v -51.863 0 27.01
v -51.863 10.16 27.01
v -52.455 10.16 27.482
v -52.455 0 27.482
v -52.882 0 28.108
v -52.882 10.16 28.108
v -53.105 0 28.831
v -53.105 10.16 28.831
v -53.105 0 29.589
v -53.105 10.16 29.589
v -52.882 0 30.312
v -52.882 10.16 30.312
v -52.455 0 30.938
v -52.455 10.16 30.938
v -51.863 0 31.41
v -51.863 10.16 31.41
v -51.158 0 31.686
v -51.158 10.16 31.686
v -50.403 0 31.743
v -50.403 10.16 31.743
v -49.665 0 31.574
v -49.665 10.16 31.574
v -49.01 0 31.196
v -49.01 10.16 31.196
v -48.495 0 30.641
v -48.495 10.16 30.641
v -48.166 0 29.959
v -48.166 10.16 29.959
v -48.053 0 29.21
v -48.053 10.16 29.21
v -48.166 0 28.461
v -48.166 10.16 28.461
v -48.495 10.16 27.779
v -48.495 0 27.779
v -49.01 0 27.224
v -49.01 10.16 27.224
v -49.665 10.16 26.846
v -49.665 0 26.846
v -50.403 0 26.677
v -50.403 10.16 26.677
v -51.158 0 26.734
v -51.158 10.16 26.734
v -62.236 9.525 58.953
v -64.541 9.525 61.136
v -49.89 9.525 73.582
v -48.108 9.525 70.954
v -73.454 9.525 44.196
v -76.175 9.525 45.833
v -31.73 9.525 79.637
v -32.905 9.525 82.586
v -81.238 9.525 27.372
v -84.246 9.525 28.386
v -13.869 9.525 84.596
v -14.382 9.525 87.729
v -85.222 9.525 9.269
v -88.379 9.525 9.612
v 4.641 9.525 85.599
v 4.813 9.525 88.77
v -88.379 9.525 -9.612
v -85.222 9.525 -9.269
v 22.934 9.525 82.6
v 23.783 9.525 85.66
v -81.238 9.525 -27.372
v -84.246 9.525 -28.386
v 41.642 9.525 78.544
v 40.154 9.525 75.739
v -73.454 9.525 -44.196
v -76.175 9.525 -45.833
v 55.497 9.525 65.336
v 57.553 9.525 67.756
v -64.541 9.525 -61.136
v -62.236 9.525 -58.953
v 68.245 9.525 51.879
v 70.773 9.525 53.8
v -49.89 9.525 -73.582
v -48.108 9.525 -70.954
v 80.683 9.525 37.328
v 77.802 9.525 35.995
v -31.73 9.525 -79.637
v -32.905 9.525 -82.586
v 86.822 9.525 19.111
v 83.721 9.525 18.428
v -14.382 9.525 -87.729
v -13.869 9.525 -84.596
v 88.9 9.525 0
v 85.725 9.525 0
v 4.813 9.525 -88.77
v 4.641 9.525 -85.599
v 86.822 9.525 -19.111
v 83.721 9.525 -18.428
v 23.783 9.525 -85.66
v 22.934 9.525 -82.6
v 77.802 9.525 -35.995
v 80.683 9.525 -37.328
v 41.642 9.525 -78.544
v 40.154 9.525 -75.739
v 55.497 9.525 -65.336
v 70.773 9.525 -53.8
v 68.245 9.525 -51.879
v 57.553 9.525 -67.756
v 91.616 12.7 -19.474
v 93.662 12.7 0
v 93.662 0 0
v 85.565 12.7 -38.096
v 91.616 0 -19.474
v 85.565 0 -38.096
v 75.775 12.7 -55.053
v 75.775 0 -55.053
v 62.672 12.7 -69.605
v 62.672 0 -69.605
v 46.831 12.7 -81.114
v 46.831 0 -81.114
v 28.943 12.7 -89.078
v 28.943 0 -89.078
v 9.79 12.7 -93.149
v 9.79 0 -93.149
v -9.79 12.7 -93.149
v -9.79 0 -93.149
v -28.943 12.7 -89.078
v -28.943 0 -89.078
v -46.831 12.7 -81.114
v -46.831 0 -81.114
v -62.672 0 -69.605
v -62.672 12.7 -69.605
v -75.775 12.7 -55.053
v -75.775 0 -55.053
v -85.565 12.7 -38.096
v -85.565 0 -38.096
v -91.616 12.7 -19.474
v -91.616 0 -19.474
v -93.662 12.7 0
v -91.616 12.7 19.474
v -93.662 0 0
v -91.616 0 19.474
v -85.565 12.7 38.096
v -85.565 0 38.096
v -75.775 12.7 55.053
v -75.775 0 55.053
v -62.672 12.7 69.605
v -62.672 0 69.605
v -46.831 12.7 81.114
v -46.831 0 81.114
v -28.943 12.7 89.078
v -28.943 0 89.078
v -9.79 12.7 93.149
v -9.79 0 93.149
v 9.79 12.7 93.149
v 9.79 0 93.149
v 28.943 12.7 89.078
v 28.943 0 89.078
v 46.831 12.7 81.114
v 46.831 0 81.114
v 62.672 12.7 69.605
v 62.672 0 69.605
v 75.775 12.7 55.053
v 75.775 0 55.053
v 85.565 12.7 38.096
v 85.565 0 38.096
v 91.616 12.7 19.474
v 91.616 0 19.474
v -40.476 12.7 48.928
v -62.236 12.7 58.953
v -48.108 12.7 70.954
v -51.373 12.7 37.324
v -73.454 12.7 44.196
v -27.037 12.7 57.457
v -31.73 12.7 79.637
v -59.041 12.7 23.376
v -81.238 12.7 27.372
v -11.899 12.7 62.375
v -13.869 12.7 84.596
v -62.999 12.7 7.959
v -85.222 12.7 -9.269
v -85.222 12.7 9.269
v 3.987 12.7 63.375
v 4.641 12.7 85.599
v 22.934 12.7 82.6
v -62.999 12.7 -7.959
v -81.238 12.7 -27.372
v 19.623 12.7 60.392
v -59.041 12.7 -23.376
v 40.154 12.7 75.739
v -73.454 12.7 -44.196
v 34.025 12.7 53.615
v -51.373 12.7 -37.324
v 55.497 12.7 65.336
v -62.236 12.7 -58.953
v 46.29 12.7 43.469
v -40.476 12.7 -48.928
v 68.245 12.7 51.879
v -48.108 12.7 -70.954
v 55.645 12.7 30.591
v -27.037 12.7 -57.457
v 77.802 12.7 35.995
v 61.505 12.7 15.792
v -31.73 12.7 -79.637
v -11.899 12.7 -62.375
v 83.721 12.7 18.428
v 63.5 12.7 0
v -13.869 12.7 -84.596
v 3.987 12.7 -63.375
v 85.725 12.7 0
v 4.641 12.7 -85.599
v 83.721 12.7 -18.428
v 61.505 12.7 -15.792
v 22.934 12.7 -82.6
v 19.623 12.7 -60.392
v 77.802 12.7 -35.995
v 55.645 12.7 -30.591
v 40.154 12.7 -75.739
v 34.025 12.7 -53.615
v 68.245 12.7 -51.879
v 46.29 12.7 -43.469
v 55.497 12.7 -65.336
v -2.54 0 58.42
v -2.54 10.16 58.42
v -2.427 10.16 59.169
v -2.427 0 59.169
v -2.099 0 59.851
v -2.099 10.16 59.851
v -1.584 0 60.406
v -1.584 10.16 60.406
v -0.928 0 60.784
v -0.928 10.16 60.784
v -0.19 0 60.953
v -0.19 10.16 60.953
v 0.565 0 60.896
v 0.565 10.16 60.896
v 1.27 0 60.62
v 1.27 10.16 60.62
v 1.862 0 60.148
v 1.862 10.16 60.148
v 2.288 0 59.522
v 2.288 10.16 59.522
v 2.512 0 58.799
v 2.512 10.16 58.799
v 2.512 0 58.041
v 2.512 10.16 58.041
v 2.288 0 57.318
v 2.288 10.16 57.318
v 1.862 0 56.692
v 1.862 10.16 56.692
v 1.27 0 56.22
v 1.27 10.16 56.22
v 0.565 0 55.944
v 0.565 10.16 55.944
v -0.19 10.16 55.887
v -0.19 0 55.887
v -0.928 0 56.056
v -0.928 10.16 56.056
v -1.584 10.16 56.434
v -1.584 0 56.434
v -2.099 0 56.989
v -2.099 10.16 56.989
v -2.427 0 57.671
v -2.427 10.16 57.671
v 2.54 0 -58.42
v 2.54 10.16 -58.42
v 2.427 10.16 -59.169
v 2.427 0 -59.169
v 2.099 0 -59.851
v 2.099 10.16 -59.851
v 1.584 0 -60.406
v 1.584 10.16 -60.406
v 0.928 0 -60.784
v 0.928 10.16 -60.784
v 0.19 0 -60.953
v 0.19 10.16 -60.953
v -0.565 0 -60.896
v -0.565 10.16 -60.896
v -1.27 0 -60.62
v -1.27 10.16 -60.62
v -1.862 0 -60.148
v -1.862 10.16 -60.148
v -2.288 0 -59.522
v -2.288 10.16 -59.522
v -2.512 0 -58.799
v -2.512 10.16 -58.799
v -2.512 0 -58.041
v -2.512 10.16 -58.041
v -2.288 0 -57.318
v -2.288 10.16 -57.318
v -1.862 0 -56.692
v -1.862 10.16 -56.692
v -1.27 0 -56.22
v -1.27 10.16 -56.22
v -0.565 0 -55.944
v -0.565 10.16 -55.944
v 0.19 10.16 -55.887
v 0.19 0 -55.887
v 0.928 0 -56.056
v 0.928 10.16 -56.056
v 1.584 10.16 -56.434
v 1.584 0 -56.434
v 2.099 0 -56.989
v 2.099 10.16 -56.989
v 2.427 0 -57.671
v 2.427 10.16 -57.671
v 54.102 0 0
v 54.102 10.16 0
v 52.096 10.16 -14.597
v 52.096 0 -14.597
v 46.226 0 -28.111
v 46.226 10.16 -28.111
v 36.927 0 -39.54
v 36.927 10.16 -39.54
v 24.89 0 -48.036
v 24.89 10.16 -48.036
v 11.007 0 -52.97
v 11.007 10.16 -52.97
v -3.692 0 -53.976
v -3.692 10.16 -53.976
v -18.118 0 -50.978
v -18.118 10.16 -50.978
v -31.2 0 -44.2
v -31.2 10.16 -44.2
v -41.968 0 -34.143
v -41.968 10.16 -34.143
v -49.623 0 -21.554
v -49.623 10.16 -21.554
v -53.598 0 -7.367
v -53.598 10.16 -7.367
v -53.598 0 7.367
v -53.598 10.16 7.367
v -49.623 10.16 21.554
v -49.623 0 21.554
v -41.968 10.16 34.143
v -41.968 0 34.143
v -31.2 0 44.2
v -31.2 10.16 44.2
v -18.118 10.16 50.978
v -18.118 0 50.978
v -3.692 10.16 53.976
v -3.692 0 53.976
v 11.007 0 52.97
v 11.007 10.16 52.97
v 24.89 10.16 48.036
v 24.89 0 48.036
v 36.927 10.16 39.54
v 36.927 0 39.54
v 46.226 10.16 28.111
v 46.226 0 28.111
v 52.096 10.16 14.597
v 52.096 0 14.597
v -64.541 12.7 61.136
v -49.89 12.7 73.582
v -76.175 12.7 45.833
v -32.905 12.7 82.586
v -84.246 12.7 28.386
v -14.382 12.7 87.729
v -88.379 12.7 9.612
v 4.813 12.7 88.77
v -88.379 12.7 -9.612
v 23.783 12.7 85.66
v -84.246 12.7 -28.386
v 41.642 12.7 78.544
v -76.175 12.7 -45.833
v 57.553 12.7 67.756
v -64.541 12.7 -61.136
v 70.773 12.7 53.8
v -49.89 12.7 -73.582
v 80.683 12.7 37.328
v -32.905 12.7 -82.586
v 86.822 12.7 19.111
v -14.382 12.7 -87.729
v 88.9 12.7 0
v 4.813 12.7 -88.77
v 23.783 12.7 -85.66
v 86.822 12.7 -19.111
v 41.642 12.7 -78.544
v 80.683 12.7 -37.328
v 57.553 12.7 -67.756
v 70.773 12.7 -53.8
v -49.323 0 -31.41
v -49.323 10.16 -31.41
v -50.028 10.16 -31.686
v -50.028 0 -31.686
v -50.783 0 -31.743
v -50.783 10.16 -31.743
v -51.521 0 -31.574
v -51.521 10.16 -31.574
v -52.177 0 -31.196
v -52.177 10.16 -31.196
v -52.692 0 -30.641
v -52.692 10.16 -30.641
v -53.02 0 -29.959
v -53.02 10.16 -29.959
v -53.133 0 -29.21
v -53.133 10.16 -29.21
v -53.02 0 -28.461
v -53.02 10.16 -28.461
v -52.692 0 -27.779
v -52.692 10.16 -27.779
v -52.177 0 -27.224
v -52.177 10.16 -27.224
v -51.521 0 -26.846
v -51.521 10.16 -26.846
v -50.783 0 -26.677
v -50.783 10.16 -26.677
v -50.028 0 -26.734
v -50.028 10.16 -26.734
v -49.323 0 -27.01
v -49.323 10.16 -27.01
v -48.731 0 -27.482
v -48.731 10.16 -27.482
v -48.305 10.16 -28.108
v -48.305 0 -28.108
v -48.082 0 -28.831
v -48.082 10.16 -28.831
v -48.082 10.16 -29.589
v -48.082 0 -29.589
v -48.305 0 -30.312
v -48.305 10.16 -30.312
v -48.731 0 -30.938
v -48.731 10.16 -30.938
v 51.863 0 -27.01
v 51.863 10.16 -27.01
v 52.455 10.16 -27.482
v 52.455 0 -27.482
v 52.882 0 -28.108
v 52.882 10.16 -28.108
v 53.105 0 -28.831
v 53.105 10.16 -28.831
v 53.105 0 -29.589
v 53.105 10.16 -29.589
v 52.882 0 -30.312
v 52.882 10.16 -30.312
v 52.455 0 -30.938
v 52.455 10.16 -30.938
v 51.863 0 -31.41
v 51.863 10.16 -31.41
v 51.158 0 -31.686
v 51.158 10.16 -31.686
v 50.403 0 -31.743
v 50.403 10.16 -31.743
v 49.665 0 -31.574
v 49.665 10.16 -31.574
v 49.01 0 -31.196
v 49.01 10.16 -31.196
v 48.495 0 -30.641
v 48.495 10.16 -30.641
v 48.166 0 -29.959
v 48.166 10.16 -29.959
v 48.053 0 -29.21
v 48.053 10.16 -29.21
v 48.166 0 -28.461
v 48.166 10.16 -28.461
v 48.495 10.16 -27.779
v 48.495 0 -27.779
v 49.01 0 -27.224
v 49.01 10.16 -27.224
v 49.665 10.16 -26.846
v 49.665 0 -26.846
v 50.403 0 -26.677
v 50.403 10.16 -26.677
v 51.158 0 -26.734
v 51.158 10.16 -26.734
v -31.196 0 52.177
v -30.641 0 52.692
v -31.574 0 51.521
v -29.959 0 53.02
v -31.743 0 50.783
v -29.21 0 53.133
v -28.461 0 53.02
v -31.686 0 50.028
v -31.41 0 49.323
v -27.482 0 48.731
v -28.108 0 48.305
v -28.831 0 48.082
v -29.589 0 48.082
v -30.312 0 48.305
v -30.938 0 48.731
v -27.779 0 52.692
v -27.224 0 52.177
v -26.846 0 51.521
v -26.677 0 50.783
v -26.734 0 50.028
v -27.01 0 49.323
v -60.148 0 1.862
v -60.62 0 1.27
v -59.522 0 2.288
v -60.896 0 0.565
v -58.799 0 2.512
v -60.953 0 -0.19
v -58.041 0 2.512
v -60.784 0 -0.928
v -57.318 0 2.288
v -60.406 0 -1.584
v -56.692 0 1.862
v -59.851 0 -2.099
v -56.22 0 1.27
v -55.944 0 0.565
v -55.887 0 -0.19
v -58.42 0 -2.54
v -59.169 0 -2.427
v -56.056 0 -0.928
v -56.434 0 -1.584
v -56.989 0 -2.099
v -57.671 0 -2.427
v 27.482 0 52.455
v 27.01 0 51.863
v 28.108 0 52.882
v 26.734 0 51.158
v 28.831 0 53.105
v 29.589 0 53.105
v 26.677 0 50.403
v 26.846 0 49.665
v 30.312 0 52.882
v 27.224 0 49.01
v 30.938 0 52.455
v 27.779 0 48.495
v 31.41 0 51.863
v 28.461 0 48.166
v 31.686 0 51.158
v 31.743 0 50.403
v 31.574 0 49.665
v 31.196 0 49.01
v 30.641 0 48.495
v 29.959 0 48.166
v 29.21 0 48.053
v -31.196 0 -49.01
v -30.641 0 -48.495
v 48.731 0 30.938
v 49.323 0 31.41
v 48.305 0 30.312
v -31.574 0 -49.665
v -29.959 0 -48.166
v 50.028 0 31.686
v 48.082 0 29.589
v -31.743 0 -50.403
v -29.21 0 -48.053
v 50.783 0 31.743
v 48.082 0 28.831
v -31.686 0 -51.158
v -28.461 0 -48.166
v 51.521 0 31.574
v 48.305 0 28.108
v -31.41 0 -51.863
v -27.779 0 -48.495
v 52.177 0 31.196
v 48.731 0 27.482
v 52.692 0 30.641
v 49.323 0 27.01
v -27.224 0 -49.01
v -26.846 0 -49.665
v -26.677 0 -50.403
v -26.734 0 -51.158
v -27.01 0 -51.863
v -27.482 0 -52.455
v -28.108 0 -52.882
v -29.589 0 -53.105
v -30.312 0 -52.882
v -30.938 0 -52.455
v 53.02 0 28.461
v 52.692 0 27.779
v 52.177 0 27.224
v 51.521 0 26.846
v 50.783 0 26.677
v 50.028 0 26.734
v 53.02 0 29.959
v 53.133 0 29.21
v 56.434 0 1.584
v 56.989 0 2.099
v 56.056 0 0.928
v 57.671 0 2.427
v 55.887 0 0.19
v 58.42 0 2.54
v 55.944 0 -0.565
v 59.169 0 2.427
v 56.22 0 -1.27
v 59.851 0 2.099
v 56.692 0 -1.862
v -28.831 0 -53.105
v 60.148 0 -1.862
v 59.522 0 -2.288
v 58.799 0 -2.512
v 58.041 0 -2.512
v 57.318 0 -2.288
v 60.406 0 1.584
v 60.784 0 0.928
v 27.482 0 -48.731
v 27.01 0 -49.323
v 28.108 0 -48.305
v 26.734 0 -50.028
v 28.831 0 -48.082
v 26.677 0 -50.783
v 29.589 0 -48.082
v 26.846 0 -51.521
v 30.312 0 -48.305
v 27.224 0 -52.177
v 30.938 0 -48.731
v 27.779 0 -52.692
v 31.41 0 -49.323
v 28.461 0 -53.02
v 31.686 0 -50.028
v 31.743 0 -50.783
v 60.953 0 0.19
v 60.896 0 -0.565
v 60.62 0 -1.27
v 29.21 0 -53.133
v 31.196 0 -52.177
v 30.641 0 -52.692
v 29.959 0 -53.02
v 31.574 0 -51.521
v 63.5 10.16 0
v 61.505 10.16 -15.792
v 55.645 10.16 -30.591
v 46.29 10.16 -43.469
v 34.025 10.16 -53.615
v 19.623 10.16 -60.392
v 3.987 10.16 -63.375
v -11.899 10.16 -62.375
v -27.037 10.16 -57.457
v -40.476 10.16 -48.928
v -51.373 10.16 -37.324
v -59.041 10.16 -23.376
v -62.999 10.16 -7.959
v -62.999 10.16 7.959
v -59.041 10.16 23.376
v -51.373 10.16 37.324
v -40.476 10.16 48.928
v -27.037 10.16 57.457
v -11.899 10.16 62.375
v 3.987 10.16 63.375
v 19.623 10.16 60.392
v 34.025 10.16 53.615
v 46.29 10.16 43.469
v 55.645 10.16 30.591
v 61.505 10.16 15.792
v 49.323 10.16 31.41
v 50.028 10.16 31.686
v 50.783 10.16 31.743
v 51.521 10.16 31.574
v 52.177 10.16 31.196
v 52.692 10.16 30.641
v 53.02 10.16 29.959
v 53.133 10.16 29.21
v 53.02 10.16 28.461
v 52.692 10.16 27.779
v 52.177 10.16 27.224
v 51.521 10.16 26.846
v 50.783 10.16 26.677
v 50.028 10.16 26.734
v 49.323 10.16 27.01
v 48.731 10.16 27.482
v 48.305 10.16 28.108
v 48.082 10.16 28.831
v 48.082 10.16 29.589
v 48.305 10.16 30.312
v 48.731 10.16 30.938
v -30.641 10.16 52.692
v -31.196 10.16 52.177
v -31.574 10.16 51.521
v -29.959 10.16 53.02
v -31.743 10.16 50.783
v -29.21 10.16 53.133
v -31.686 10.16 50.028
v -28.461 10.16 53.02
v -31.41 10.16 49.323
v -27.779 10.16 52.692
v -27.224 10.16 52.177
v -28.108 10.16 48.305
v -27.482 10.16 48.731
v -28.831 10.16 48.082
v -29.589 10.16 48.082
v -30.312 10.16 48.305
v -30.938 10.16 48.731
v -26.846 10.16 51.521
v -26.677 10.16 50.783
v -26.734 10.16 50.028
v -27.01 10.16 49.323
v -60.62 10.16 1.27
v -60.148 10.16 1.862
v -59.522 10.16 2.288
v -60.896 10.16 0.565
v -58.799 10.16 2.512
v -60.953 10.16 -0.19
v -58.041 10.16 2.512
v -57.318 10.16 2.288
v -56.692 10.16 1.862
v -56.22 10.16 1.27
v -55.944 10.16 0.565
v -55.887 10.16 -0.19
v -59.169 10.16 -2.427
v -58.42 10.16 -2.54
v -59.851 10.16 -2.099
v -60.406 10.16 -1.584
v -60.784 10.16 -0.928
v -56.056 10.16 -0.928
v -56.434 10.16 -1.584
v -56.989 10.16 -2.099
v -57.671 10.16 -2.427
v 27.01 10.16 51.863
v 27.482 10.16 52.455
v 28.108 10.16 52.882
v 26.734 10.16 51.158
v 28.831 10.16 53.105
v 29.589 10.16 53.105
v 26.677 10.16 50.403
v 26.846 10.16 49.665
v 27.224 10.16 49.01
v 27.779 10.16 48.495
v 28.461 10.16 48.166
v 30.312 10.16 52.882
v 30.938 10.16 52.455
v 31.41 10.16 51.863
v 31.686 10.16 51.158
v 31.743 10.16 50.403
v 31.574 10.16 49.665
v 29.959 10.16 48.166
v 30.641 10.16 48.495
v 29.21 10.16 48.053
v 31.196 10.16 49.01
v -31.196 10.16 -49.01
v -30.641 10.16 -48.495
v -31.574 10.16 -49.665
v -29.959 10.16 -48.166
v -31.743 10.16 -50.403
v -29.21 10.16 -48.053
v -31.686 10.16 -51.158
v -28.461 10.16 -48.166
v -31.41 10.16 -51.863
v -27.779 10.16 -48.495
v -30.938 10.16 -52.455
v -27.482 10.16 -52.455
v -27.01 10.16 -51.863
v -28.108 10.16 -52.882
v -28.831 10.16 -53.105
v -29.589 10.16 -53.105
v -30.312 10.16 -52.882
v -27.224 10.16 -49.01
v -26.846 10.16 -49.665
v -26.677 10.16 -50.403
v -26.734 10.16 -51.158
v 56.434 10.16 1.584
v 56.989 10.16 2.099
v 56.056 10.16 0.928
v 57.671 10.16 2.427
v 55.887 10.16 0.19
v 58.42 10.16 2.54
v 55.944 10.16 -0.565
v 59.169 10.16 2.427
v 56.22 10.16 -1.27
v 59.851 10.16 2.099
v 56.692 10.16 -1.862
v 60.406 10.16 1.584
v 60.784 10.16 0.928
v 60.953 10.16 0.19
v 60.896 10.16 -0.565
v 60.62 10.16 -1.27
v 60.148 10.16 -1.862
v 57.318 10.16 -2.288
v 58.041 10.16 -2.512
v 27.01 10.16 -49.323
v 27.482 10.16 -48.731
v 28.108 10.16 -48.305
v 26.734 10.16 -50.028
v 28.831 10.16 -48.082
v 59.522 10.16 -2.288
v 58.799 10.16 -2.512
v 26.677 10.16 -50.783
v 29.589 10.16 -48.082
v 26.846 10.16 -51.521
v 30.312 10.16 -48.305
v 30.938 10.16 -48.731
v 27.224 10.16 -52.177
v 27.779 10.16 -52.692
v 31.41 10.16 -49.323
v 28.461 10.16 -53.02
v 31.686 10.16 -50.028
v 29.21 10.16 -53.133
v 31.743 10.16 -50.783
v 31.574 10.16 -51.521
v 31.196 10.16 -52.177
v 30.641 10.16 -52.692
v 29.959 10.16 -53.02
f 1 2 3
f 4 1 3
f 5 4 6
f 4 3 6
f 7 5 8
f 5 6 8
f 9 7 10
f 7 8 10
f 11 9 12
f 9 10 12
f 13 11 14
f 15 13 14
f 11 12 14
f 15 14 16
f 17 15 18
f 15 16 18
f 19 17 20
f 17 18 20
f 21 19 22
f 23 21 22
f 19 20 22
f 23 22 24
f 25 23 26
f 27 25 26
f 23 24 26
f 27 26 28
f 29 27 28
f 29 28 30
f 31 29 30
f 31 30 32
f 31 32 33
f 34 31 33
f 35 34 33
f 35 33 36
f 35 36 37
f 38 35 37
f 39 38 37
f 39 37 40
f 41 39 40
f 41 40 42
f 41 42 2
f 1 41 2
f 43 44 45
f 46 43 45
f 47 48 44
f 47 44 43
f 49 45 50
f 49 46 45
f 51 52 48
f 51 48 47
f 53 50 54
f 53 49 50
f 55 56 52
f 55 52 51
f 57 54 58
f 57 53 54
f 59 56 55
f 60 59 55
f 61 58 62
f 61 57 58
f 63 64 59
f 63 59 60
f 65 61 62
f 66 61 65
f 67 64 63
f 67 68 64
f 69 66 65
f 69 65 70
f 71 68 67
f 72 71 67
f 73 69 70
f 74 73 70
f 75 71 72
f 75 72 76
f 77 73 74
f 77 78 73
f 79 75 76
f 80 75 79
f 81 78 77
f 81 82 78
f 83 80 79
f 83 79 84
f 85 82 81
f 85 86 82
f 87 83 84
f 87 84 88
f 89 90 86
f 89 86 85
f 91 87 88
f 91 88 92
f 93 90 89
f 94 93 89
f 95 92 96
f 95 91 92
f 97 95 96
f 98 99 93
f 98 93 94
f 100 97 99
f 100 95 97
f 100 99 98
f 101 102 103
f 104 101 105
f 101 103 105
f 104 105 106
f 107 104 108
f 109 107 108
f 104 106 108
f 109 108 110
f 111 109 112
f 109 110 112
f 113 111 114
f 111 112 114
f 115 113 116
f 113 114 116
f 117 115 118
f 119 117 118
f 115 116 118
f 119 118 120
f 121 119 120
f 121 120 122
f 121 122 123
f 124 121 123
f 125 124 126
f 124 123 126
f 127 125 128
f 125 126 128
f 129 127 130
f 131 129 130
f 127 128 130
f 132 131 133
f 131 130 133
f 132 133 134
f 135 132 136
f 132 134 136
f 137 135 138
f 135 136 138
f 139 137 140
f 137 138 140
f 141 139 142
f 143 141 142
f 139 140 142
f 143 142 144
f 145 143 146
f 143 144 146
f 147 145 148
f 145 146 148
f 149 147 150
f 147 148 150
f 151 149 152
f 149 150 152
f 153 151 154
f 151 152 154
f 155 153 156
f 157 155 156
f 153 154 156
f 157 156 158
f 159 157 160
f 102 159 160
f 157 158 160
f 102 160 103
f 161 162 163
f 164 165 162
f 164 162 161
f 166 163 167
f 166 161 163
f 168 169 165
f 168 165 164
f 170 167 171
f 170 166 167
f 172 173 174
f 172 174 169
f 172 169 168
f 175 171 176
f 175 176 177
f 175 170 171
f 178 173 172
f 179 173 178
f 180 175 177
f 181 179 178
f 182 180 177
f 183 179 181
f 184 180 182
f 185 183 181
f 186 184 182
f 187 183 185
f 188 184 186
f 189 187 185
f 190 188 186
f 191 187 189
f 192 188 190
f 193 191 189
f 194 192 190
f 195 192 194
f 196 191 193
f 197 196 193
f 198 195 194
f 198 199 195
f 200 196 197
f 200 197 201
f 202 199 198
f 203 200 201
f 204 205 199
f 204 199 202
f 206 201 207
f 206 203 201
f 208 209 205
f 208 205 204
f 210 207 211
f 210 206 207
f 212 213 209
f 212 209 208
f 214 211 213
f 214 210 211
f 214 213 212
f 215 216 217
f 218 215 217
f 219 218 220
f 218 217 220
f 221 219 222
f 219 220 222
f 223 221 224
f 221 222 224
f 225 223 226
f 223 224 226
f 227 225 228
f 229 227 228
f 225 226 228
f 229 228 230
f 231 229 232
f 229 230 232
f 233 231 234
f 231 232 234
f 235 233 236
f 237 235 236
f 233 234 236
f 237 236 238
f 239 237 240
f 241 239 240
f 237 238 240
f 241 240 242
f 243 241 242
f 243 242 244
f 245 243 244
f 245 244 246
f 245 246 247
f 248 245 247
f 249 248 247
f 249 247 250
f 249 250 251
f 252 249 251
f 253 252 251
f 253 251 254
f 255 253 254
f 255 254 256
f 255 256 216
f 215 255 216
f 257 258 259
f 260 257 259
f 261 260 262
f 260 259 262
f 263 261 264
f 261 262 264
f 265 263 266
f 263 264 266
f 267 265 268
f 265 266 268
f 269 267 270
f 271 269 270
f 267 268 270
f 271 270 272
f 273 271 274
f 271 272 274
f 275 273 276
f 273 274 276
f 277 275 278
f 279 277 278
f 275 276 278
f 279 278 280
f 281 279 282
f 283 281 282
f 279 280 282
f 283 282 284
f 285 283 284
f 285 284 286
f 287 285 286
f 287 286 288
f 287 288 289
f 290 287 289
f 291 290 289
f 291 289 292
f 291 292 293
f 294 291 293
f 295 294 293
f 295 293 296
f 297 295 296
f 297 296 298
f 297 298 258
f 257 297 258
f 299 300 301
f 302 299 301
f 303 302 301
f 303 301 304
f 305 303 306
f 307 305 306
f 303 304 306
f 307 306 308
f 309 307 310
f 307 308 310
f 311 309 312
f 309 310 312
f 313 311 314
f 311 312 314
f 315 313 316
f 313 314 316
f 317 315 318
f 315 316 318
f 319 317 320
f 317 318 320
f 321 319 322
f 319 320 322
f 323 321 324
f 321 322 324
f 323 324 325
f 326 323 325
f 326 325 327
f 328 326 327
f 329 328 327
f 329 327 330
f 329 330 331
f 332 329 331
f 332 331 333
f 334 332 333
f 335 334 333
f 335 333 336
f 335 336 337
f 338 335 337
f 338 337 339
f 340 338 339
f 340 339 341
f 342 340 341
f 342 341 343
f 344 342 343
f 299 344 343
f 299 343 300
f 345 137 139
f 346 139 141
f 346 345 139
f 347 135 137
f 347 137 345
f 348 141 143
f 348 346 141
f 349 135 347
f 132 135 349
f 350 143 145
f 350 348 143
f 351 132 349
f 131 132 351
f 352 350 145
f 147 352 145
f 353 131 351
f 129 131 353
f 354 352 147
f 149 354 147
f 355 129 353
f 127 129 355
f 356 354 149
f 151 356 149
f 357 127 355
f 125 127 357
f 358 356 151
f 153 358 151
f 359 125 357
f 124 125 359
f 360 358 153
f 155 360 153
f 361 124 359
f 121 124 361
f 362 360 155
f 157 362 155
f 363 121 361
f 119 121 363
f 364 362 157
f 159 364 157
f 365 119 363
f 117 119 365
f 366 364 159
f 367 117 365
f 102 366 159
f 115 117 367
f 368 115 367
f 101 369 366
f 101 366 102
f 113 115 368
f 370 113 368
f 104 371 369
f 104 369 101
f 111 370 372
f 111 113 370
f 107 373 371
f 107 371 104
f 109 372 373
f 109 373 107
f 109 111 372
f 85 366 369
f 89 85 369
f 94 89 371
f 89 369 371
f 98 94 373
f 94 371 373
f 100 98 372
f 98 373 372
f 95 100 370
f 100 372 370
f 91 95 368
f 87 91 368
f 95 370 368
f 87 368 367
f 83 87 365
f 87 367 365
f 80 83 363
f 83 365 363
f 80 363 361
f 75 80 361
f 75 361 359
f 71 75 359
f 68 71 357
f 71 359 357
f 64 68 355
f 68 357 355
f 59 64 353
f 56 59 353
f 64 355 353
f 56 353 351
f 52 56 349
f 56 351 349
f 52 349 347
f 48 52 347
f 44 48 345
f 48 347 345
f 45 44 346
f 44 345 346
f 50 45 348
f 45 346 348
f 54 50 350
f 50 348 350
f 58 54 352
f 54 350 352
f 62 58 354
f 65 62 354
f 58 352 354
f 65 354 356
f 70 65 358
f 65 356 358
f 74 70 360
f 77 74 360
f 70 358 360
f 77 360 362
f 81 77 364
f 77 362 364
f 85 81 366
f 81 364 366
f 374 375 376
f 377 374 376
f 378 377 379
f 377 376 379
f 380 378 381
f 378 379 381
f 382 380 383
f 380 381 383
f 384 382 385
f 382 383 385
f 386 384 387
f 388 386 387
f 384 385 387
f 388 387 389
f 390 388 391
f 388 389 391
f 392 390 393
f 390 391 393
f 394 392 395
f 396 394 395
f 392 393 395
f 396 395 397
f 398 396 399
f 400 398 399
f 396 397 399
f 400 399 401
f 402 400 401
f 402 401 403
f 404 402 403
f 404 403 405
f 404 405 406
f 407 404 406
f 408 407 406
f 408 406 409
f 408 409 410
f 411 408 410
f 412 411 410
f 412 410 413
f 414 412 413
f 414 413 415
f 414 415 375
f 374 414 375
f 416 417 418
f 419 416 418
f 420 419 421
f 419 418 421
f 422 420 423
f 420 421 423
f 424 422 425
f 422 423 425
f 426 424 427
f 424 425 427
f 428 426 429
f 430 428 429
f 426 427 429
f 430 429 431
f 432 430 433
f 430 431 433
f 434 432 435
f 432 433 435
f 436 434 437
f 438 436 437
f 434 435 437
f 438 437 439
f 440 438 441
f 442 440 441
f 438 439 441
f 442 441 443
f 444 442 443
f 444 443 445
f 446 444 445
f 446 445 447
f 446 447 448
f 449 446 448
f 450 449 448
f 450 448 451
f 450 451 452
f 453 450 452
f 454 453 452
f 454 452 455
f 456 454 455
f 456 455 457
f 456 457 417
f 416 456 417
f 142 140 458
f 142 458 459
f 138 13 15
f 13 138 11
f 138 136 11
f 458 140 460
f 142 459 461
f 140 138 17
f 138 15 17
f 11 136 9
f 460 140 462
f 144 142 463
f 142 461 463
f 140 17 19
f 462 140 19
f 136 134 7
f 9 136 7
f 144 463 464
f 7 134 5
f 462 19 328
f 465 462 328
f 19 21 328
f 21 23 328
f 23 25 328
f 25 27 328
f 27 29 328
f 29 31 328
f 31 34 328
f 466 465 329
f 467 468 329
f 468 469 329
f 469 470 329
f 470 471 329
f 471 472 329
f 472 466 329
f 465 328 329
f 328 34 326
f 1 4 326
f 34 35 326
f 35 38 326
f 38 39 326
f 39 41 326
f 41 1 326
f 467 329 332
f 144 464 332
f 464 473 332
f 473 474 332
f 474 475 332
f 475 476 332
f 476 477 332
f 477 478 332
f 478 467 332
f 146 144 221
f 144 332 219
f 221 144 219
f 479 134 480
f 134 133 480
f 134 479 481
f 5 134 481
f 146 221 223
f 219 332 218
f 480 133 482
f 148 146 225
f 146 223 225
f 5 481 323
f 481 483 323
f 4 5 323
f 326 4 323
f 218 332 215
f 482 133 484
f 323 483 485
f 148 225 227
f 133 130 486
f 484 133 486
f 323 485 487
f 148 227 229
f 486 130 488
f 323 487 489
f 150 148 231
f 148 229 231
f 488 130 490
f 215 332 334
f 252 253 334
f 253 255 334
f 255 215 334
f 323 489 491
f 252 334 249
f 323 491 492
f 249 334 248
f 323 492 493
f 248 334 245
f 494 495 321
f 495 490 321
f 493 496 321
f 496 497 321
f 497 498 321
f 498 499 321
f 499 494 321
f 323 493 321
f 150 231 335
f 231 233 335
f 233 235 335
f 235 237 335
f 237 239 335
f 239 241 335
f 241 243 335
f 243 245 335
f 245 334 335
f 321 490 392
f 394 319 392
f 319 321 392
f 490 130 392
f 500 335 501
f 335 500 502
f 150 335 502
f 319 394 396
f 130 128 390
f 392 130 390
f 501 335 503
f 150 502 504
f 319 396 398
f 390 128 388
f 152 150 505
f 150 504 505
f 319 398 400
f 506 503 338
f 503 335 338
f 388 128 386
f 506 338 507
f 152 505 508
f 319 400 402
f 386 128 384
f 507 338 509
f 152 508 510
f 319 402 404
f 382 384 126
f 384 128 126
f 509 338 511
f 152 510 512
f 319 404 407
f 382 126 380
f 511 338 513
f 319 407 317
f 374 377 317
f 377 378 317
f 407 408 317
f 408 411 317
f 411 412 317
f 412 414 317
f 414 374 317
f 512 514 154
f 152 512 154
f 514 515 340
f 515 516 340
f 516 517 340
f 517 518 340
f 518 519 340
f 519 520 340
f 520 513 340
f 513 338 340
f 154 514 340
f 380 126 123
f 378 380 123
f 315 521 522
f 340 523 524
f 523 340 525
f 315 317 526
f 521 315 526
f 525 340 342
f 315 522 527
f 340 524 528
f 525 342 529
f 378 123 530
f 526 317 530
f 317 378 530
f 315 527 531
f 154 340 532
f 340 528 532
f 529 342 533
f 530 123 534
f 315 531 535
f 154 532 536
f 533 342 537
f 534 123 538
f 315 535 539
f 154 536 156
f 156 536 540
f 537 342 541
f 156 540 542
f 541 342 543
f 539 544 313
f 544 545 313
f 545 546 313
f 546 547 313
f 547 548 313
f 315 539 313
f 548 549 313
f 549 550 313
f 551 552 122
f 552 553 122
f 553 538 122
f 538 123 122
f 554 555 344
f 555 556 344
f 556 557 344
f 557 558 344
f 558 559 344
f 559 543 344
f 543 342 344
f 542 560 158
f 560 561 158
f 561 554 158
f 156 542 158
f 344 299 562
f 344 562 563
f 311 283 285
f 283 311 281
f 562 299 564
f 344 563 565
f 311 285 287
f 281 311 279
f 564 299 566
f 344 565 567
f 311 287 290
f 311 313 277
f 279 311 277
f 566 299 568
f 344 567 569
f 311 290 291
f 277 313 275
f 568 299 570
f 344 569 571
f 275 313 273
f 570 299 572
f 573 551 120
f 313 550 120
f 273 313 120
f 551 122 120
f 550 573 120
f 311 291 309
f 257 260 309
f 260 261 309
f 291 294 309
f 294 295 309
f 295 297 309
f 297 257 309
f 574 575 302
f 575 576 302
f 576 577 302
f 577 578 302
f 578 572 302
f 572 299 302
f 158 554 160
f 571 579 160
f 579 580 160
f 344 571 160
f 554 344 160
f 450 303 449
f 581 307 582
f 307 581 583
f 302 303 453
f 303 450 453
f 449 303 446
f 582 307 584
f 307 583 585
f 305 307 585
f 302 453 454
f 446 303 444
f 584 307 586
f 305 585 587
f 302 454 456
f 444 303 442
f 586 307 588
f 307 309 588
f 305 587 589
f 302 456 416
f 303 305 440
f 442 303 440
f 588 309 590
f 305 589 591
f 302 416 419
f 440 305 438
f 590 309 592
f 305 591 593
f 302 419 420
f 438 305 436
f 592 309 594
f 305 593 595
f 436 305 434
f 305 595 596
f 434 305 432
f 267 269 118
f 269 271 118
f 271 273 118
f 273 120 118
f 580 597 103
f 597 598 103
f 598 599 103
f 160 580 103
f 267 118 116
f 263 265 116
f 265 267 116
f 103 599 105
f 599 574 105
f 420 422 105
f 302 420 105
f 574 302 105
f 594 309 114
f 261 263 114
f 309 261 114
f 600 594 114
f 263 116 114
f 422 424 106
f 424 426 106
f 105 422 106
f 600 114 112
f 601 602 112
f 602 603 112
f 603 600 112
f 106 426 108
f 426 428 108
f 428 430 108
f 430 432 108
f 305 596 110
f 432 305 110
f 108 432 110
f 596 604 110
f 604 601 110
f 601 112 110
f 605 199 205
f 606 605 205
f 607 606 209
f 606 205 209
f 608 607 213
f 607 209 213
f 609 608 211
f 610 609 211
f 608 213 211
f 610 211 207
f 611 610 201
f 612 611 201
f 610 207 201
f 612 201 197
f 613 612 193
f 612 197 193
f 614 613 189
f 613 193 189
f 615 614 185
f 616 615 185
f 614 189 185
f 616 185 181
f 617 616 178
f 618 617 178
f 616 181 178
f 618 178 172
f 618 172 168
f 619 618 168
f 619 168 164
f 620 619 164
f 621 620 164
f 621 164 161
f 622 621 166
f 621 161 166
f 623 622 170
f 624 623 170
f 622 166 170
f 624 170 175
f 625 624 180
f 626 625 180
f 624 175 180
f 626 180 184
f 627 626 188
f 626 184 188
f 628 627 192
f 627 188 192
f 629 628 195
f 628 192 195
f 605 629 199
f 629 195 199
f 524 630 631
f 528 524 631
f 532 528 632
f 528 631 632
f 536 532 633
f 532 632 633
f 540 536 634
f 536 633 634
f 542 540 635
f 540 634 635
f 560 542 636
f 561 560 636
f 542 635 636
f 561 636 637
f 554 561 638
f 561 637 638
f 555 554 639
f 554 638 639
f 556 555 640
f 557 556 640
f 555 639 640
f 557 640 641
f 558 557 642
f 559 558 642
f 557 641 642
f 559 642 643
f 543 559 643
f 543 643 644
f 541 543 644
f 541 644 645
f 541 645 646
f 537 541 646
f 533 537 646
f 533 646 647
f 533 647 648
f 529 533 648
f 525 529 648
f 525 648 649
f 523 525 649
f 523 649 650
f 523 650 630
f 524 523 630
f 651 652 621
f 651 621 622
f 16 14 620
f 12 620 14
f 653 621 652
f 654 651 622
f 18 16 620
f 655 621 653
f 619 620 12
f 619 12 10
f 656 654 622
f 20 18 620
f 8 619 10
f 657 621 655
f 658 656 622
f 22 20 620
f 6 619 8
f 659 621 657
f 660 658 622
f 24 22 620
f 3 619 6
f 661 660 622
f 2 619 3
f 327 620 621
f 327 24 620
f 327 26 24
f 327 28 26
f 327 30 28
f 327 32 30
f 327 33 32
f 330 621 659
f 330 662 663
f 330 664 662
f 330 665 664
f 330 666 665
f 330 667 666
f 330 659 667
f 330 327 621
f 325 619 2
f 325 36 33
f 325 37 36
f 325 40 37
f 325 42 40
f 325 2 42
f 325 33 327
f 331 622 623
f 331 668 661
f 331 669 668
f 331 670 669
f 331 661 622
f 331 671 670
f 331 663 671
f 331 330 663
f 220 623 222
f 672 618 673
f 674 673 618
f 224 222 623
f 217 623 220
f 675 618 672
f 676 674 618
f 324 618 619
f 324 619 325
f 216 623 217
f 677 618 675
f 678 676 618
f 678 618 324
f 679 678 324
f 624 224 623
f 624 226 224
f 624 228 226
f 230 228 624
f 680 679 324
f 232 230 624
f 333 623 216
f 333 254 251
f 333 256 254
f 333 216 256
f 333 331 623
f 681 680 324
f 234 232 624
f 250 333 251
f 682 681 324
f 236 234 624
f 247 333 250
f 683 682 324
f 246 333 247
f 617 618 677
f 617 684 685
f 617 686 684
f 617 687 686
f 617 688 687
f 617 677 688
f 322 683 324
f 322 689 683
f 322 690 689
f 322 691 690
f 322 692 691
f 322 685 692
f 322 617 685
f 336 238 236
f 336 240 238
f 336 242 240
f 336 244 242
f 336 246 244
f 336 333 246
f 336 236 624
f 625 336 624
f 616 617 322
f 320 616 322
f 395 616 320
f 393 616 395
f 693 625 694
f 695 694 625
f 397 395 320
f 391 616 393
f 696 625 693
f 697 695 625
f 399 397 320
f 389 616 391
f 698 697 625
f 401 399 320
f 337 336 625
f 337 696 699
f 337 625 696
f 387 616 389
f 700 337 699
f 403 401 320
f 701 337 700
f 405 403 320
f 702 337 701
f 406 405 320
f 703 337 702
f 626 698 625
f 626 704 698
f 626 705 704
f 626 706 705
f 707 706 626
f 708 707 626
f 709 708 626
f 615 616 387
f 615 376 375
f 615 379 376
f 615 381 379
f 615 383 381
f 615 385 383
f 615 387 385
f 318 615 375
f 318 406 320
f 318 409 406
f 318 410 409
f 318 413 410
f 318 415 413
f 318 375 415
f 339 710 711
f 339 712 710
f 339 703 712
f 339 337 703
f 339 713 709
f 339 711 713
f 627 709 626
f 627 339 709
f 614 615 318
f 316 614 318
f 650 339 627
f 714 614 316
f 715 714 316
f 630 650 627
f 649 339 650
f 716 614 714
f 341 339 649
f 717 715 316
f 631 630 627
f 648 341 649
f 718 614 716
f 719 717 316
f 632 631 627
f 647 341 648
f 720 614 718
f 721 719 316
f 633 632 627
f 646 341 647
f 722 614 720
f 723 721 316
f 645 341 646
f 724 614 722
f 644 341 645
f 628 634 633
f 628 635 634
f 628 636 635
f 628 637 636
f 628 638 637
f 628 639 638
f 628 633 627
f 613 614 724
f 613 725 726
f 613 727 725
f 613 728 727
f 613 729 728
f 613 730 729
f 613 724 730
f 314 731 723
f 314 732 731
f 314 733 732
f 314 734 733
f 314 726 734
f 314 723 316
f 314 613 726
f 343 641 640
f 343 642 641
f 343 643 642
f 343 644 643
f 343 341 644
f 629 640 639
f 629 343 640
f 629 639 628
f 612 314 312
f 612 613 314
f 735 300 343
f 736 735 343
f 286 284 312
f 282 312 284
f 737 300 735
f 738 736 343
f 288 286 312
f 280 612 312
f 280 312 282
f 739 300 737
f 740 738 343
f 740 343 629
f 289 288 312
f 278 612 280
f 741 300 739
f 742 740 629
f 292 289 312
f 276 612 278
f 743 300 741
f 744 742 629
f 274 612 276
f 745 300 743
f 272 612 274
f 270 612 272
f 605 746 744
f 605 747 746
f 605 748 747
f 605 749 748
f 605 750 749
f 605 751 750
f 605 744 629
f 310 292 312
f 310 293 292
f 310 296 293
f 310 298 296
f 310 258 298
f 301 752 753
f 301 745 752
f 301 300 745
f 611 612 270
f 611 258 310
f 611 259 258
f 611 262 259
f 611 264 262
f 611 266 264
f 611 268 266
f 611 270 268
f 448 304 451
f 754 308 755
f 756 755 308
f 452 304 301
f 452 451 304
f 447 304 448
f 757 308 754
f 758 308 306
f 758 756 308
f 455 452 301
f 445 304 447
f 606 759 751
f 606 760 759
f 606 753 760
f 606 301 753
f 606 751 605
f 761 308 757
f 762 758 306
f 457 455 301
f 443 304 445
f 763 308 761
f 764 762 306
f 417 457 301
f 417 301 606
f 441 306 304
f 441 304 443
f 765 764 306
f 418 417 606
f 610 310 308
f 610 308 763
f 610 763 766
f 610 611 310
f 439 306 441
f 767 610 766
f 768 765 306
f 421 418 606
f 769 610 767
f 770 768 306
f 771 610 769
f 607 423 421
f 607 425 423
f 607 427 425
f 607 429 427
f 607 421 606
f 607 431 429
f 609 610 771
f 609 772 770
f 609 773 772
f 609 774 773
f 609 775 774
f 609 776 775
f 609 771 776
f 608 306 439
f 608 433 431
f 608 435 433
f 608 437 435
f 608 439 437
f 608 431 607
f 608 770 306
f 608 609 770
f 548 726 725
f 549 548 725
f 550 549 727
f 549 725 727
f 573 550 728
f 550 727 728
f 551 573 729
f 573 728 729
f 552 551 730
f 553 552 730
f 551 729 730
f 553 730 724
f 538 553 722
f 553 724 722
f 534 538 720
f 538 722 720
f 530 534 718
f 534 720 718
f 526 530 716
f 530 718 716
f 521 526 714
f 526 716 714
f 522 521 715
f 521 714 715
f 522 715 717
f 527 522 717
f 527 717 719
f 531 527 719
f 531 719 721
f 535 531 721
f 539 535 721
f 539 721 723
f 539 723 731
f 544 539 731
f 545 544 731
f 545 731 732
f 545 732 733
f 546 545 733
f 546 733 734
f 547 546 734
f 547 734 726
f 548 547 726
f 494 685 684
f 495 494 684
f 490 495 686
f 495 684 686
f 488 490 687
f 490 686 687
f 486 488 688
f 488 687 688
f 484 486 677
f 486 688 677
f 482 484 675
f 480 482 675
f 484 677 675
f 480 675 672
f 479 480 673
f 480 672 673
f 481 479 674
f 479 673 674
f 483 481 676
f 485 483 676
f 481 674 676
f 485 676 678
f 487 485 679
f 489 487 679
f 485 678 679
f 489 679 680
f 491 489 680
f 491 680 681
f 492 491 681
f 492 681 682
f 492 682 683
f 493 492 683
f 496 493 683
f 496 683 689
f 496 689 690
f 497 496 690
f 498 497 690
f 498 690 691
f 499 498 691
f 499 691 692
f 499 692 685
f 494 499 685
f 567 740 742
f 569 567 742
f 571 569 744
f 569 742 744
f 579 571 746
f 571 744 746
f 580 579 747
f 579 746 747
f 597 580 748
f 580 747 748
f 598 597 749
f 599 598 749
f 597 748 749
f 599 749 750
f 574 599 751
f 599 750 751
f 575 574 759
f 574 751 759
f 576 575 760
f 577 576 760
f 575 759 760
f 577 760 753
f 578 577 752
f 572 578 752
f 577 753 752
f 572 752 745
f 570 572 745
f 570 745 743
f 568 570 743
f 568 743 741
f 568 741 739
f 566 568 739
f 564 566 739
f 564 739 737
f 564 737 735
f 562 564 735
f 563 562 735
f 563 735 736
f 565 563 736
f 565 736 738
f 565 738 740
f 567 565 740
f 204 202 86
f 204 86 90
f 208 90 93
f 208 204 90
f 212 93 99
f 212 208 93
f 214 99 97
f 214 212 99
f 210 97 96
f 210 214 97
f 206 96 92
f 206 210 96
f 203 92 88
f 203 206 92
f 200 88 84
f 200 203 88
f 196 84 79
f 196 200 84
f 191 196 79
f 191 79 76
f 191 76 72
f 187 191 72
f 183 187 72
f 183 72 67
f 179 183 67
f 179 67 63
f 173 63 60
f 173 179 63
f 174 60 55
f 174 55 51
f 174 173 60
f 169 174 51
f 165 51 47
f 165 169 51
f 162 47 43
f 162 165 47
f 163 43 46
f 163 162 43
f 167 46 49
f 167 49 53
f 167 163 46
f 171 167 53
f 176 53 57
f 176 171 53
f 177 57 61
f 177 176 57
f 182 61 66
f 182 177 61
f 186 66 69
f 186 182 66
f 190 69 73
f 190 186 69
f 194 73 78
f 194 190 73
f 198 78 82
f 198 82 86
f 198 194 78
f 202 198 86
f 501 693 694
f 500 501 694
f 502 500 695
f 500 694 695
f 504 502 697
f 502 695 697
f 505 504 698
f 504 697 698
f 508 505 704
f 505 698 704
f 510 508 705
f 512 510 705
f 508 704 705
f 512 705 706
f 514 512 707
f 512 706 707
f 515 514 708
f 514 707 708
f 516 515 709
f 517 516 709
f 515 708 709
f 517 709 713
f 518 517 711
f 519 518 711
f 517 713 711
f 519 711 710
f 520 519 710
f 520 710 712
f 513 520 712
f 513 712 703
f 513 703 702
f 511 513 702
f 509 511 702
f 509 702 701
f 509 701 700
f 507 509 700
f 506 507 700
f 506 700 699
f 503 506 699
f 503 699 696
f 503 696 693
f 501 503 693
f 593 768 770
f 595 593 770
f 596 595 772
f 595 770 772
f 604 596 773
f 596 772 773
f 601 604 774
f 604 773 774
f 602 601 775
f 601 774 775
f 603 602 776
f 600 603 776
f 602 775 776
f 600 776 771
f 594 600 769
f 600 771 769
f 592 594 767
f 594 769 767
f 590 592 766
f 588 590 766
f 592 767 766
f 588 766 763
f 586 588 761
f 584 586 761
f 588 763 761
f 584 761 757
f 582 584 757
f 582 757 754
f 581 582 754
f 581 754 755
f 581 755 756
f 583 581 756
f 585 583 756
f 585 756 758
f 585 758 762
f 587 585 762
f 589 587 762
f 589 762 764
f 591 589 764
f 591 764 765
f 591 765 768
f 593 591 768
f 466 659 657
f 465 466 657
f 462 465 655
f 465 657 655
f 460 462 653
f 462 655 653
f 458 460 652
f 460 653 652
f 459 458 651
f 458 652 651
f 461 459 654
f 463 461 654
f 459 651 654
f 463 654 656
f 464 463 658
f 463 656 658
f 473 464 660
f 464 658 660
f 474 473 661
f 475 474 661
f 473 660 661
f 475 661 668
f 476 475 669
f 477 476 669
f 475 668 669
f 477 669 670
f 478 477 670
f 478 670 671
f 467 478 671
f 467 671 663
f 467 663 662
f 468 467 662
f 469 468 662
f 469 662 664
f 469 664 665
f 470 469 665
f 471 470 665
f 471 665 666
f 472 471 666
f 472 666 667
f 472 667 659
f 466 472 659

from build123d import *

# Parameters (mm, degrees)
SKETCH1_R           = 93.6625
BOSS_EXTRUDE1_DEPTH = 12.7
SKETCH2_R           = 54.102
CUT_EXTRUDE1_DEPTH  = 13.7
SKETCH3_R           = 63.5
CUT_EXTRUDE2_DEPTH  = 2.54
SKETCH4_R           = 2.54
CUT_EXTRUDE3_DEPTH  = 13.7
CIRPATTERN1_COUNT   = 12
SKETCH5_R           = 88.9
SKETCH5_R_2         = 85.725
CUT_EXTRUDE4_DEPTH  = 3.175


with BuildPart() as part:
    # Sketch1 → Boss-Extrude1 (new body)
    with BuildSketch(Plane(origin=(0, 0, 0), x_dir=(1, 0, 0), z_dir=(0, 1, 0))):
        Circle(SKETCH1_R)
    extrude(amount=BOSS_EXTRUDE1_DEPTH)

    # Sketch2 → Cut-Extrude1 (cut, through all)
    with BuildSketch(Plane(origin=(0, 12.7, 0), x_dir=(1, 0, 0), z_dir=(0, 1, 0))):
        Circle(SKETCH2_R)
    extrude(amount=-CUT_EXTRUDE1_DEPTH, mode=Mode.SUBTRACT)

    # Sketch3 → Cut-Extrude2 (cut)
    with BuildSketch(Plane(origin=(0, 12.7, 0), x_dir=(1, 0, 0), z_dir=(0, 1, 0))):
        Circle(SKETCH3_R)
    extrude(amount=-CUT_EXTRUDE2_DEPTH, mode=Mode.SUBTRACT)

    # Sketch4 → Cut-Extrude3 (cut, through all)
    with BuildSketch(Plane(origin=(0, 12.7, 0), x_dir=(1, 0, 0), z_dir=(0, 1, 0))):
        with Locations((0, 58.42)):
            Circle(SKETCH4_R)
    cut_extrude3 = extrude(amount=-CUT_EXTRUDE3_DEPTH, mode=Mode.SUBTRACT)

    # CirPattern1: Cut-Extrude3 ×12 about axis
    cirpattern1_axis = Axis((0, 0, 0), (0, 1, 0))
    for i in range(1, CIRPATTERN1_COUNT):
        add(cut_extrude3.rotate(cirpattern1_axis, i * 360 / CIRPATTERN1_COUNT), mode=Mode.SUBTRACT)

    # Sketch5 → Cut-Extrude4 (cut)
    with BuildSketch(Plane(origin=(0, 12.7, 0), x_dir=(1, 0, 0), z_dir=(0, 1, 0))):
        Circle(SKETCH5_R)
        Circle(SKETCH5_R_2, mode=Mode.SUBTRACT)
    extrude(amount=-CUT_EXTRUDE4_DEPTH, mode=Mode.SUBTRACT)


solid = part.part
